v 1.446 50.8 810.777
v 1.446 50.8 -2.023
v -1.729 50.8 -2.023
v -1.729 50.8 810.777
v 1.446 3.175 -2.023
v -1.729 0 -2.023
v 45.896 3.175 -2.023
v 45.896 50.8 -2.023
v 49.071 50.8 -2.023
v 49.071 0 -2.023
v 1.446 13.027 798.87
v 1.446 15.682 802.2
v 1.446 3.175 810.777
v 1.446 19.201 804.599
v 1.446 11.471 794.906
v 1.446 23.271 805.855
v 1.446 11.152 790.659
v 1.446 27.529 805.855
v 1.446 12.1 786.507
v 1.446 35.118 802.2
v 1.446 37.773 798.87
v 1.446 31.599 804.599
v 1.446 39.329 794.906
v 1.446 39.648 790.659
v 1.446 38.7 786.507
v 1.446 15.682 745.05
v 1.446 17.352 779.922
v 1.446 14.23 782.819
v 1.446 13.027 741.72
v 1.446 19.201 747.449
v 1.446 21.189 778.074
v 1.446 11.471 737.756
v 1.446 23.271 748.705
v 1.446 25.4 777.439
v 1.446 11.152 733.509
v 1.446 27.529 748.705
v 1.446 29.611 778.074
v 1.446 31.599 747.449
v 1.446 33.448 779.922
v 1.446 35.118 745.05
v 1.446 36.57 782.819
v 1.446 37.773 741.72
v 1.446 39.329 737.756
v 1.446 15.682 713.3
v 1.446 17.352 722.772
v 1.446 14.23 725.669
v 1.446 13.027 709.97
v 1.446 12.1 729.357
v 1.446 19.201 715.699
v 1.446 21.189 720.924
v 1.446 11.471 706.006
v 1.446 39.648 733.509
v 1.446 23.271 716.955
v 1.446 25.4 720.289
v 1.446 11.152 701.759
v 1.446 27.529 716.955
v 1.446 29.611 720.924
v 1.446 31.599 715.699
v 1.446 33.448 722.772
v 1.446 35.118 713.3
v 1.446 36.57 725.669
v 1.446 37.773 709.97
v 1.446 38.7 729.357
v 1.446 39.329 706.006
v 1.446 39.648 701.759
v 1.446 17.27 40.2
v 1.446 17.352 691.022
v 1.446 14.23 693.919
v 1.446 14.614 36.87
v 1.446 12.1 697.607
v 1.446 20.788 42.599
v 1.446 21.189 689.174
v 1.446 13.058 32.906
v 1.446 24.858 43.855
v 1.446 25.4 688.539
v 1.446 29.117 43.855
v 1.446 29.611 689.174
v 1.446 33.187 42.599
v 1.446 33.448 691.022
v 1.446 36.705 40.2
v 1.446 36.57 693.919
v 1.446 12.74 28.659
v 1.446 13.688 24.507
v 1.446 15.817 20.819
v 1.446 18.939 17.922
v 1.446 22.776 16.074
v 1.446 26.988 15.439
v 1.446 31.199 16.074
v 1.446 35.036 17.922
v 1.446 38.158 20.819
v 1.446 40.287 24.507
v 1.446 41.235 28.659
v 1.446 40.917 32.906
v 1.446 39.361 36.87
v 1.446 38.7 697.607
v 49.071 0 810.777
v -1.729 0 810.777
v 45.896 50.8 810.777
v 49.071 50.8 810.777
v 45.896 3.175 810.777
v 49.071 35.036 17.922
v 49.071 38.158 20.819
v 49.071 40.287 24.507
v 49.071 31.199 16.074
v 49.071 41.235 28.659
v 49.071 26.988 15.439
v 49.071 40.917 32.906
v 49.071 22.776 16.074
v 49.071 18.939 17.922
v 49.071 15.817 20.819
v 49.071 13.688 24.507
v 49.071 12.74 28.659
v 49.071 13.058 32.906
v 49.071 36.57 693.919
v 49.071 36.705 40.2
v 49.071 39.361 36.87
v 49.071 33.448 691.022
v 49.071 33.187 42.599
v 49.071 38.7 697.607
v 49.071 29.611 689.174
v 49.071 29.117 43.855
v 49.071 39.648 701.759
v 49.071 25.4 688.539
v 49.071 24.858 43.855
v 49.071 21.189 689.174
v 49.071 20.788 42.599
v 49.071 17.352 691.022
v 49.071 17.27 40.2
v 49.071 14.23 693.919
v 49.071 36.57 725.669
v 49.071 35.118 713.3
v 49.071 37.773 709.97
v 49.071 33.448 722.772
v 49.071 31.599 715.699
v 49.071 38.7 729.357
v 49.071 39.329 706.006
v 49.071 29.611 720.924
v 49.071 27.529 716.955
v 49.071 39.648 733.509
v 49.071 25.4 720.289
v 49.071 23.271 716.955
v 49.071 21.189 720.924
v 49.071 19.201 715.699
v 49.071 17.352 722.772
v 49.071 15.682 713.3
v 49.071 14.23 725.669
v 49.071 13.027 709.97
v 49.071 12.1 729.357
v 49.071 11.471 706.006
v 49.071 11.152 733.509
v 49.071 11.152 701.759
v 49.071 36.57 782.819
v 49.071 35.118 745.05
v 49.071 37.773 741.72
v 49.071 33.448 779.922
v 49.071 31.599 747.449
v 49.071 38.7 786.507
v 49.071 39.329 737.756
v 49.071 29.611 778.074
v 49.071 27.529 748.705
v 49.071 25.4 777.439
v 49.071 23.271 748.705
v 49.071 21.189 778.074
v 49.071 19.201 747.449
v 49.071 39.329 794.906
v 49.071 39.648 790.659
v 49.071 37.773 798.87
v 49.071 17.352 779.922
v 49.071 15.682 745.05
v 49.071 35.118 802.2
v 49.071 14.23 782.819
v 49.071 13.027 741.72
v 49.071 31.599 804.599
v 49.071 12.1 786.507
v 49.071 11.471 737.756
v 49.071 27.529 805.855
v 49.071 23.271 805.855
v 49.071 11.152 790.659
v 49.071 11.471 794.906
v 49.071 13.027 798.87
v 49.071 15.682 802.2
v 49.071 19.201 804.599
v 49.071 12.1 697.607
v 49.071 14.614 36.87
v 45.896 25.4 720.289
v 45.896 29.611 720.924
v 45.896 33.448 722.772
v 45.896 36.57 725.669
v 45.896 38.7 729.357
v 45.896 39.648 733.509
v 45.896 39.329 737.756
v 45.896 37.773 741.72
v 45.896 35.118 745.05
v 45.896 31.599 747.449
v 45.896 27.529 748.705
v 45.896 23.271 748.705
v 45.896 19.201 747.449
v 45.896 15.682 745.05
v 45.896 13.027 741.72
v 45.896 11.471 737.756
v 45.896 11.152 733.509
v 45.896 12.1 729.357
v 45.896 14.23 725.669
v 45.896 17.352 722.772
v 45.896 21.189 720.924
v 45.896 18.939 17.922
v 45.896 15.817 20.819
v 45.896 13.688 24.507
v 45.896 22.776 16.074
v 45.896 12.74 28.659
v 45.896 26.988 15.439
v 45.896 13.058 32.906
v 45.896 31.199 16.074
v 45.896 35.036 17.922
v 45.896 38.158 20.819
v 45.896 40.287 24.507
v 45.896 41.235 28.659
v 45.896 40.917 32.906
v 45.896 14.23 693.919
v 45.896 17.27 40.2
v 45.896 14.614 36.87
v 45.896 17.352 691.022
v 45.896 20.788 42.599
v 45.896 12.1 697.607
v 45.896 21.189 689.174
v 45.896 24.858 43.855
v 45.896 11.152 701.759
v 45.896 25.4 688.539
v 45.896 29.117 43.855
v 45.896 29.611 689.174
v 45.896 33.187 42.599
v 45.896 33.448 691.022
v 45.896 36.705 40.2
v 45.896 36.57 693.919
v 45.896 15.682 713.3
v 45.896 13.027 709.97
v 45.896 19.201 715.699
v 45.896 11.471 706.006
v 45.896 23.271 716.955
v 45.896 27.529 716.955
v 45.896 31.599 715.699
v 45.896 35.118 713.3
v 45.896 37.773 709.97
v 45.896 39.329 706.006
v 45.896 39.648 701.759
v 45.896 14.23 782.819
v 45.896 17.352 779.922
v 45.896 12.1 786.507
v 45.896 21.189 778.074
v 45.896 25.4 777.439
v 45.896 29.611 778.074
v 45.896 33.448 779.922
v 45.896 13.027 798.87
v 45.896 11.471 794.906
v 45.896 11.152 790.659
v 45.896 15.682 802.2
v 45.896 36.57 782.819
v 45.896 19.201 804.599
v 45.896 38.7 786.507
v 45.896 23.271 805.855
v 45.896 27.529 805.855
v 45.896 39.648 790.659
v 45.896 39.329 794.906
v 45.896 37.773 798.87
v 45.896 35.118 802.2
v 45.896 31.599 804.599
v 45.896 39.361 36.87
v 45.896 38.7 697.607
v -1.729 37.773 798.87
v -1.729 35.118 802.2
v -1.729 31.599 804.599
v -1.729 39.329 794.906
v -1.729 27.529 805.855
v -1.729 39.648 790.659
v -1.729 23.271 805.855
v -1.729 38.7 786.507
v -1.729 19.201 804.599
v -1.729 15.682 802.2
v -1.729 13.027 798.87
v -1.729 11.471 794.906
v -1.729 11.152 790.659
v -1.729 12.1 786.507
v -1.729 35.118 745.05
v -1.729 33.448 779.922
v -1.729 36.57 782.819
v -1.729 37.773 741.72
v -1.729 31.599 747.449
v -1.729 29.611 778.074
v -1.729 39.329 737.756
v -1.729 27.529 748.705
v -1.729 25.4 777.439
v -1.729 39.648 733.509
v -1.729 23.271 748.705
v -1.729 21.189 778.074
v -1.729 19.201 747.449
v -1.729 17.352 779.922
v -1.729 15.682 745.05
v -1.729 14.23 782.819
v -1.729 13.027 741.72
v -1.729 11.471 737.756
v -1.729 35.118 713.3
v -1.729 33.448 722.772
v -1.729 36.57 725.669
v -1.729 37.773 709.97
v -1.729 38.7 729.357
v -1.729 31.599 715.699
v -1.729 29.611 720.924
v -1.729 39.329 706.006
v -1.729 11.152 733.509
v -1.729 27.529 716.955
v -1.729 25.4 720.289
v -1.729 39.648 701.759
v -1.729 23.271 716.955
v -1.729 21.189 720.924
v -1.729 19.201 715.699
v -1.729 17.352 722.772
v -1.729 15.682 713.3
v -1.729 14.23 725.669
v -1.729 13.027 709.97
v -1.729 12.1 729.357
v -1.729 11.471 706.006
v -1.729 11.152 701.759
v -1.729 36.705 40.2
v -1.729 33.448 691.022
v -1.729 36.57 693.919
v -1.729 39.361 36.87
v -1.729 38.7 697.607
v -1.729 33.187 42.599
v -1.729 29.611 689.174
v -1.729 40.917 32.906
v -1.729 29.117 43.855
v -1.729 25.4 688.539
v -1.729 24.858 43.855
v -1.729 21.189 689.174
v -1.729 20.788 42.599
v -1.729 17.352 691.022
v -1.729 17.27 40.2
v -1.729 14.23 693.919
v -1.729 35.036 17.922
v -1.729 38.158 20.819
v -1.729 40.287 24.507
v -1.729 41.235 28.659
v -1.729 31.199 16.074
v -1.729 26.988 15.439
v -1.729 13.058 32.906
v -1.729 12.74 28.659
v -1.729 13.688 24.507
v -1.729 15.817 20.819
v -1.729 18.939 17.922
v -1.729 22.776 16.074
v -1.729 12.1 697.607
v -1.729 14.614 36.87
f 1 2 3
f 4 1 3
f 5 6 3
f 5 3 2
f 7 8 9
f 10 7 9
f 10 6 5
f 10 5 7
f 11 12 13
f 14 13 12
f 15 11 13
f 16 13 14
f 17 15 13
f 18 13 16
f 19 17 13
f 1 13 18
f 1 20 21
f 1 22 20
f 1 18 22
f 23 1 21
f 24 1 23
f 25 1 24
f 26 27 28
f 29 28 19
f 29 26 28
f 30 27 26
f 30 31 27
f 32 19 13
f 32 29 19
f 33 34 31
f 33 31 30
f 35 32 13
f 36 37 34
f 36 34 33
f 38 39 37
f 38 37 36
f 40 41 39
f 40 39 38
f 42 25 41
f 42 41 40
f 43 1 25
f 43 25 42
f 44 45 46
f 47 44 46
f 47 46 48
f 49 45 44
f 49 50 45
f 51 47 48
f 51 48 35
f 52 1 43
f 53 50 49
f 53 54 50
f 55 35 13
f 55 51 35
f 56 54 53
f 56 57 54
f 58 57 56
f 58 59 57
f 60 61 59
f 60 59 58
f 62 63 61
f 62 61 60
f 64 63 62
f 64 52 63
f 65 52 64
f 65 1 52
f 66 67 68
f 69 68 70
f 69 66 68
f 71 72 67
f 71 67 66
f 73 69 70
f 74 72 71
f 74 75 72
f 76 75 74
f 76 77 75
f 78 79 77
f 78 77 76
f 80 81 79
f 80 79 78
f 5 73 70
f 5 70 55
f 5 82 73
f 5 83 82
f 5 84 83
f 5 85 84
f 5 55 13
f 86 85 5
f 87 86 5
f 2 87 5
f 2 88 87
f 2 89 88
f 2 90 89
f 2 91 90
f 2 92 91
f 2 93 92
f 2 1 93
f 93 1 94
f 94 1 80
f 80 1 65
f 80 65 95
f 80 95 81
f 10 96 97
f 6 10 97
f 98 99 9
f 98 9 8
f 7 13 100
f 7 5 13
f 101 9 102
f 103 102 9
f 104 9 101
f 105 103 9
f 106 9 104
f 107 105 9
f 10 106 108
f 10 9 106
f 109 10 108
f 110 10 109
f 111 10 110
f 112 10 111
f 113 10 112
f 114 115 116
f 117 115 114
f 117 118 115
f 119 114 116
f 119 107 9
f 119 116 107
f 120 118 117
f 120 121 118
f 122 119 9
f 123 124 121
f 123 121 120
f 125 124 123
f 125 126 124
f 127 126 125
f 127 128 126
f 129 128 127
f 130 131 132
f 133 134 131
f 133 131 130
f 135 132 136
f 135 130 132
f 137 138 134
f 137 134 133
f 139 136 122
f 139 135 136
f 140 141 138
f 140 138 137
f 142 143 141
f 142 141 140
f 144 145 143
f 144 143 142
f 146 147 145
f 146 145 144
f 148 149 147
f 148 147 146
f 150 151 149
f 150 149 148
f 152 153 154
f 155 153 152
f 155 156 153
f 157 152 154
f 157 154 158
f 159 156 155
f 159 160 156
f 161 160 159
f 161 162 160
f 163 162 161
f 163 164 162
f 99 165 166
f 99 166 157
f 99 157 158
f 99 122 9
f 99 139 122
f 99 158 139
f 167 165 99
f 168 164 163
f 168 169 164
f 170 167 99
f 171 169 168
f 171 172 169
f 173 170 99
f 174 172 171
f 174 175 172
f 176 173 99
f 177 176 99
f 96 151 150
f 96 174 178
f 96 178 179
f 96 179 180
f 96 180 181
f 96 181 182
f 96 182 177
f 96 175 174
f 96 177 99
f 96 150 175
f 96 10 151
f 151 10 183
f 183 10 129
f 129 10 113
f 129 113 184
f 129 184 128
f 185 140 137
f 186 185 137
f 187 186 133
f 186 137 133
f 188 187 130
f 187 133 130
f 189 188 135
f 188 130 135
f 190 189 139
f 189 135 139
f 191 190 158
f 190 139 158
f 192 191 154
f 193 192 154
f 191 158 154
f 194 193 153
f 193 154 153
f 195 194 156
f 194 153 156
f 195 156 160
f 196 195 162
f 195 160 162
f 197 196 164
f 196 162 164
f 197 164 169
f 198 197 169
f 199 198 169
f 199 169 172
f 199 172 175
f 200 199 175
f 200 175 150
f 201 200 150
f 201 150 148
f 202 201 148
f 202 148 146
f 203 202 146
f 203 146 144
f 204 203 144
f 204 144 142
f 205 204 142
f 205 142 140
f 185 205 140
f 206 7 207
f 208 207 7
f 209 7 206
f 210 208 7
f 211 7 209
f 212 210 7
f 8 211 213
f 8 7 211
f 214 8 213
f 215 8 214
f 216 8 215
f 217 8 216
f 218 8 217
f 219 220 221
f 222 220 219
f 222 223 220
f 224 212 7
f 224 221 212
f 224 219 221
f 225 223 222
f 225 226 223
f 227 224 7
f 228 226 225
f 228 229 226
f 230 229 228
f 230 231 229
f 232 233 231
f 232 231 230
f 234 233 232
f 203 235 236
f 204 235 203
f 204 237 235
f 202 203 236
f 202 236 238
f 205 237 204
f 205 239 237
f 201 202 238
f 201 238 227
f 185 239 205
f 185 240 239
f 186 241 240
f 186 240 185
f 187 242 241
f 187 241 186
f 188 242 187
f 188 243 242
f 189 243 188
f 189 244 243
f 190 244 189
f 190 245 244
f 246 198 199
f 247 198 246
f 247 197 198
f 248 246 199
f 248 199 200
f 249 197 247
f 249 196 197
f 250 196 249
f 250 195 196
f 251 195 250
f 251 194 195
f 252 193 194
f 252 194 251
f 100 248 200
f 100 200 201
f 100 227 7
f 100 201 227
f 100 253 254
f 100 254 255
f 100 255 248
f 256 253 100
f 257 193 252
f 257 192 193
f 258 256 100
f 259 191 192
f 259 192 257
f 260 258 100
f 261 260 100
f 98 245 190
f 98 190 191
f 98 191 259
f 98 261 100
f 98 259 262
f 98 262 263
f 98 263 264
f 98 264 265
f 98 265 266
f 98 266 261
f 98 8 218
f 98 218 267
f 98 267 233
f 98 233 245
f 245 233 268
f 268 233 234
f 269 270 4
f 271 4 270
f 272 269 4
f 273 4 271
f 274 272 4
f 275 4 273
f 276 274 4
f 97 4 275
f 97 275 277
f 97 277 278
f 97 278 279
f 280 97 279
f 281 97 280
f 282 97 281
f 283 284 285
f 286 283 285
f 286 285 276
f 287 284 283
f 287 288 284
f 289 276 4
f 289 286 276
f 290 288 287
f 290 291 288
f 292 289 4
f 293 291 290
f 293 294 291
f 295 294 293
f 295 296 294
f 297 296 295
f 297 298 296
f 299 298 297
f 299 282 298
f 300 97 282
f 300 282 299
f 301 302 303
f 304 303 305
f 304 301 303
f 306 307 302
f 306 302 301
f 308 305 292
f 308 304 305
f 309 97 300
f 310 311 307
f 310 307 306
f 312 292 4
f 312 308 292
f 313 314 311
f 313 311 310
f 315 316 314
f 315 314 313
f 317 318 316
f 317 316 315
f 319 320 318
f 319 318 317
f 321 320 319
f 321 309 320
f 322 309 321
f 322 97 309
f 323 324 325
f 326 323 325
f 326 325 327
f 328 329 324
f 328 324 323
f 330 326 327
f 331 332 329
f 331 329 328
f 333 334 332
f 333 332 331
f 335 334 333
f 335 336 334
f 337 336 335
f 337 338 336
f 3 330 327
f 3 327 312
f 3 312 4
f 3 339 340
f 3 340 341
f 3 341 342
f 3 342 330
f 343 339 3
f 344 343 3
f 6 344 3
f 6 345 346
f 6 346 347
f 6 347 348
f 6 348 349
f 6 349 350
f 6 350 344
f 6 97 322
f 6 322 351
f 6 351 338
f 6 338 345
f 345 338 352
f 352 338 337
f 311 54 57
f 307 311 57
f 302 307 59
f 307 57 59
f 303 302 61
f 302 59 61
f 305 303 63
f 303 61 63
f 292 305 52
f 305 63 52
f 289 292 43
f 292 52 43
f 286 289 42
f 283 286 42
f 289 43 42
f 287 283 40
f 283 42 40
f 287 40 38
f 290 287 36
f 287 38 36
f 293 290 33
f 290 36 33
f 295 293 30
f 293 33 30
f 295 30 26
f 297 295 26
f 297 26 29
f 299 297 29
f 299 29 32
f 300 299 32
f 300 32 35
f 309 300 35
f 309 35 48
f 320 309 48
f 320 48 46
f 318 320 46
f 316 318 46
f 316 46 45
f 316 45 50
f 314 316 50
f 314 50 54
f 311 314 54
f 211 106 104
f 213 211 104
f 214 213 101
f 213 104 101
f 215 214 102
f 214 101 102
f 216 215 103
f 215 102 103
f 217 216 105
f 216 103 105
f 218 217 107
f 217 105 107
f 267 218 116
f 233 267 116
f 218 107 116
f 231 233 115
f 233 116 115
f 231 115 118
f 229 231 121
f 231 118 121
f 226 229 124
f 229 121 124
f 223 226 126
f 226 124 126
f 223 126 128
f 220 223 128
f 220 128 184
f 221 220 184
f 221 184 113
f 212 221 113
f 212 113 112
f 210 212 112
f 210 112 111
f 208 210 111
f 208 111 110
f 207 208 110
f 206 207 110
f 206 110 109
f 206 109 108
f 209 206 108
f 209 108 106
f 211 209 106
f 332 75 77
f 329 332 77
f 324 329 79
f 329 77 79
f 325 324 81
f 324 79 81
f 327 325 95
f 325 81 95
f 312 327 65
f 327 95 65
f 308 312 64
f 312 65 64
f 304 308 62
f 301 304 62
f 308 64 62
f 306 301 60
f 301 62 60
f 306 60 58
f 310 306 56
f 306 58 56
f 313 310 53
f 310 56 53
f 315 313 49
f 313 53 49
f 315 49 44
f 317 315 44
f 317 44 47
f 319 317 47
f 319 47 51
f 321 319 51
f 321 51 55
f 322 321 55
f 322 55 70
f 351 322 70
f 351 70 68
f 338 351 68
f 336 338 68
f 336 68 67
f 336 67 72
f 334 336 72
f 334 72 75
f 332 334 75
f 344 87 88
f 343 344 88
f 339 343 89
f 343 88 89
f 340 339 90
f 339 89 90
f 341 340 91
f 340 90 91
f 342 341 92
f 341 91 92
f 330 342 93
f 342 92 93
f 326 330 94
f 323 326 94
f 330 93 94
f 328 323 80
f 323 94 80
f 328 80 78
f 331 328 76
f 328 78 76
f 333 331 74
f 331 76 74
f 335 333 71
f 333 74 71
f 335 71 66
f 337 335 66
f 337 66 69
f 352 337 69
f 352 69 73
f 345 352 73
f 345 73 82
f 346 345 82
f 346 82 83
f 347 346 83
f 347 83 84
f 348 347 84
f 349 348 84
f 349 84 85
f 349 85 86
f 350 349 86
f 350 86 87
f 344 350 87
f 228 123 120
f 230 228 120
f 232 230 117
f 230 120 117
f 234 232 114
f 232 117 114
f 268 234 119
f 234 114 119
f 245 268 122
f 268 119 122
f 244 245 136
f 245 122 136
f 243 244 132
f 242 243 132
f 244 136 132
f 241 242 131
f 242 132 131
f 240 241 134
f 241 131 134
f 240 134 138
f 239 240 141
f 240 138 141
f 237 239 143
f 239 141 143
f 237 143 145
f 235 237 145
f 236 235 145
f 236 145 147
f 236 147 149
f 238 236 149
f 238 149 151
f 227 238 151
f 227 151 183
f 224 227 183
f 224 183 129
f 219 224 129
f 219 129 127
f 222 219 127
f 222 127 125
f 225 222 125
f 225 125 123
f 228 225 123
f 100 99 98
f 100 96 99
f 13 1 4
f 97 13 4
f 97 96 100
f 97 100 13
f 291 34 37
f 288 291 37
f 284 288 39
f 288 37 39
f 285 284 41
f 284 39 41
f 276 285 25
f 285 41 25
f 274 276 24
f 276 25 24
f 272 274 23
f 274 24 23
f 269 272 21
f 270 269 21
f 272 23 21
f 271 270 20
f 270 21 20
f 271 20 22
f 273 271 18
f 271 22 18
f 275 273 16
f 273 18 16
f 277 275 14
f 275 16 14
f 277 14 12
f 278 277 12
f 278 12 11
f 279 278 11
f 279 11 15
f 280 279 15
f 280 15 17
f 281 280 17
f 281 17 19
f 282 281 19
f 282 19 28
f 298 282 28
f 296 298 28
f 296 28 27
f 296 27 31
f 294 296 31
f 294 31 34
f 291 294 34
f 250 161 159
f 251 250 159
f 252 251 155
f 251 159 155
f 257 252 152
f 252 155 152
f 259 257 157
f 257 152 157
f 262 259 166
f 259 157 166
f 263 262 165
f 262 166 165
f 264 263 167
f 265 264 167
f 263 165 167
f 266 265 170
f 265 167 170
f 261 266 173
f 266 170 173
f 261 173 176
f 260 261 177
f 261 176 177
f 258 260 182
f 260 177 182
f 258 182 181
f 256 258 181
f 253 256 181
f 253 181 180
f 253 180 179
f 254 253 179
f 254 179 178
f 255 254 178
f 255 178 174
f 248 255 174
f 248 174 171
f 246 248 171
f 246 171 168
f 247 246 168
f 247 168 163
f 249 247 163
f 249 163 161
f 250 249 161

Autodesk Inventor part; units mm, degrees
ref_plane "YZ Plane" through (0, 0, 0) normal (1, 0, 0) x (0, 1, 0)
ref_plane "XZ Plane" through (0, 0, 0) normal (0, 1, 0) x (-1, 0, 0)
ref_plane "XY Plane" through (0, 0, 0) normal (0, 0, 1) x (1, 0, 0)
sketch "Sketch1" plane through (0, 0, 0) normal (0, 1, 0) x (-1, 0, 0)
  line L0 (1.7293, -2.0233) -> (-49.0707, -2.0233)
  line L1 (-49.0707, -2.0233) -> (-49.0707, 810.7767)
  line L2 (-49.0707, 810.7767) -> (1.7293, 810.7767)
  line L3 (1.7293, 810.7767) -> (1.7293, -2.0233)
  point P0 (0, 0)
  dimension "d0" = 50.8
  dimension "d1" = 812.8
extrude "Extrusion1" add sketch "Sketch1" along normal blind 50.8
sketch "Sketch2" plane through (0, 50.8, 0) normal (0, 1, 0) x (1, 0, 0)
  line L0 (49.0707, 2.0233) -> (-1.7293, 2.0233) projected
  line L1 (-1.7293, 2.0233) -> (1.4457, 2.0233)
  line L2 (49.0707, 2.0233) -> (45.8957, 2.0233)
  line L3 (1.4457, 2.0233) -> (45.8957, 2.0233)
  line L4 (45.8957, 2.0233) -> (45.8957, -810.7767)
  line L5 (45.8957, -810.7767) -> (1.4457, -810.7767)
  line L6 (1.4457, -810.7767) -> (1.4457, 2.0233)
  point P0 (0, 0)
  dimension "d4" = 3.175
  dimension "d5" = 3.175
  dimension "d6" = 44.45
  dimension "d7" = 812.8
extrude "Extrusion2" cut sketch "Sketch2" against normal blind 47.625
sketch "Sketch3" plane through (49.0707, 0, 810.7767) normal (1, 0, 0) x (0, 0, -1)
  line L0 (0, 0) -> (0, 50.8) projected
  line L1 (0, 25.4) -> (19.05, 25.4)
  circle A0 centre (19.05, 25.4) radius 14.2875
  line L2 (19.05, 25.4) -> (76.2, 25.4)
  circle A1 centre (76.2, 25.4) radius 14.2875
  line L3 (76.2, 25.4) -> (107.95, 25.4)
  circle A2 centre (107.95, 25.4) radius 14.2875
  point P0 (810.7767, 0)
  dimension "d10" = 19.05
  dimension "d11" = 28.575
  dimension "d12" = 57.15
  dimension "d13" = 28.575
  dimension "d14" = 31.75
  dimension "d15" = 28.575
extrude "Extrusion3" cut sketch "Sketch3" against normal blind 76.2
sketch "Sketch4" plane through (49.0707, 0, 810.7767) normal (1, 0, 0) x (0, 0, -1)
  line L0 (812.8, 50.8) -> (812.8, 3.175) projected
  line L1 (812.8, 26.9875) -> (781.05, 26.9875)
  circle A0 centre (781.05, 26.9875) radius 14.2875
  point P0 (810.7767, 0)
  dimension "d18" = 31.75
  dimension "d19" = 28.575
extrude "Extrusion4" cut sketch "Sketch4" against normal blind 76.2
properties part number "36in Aluminum Channel"
